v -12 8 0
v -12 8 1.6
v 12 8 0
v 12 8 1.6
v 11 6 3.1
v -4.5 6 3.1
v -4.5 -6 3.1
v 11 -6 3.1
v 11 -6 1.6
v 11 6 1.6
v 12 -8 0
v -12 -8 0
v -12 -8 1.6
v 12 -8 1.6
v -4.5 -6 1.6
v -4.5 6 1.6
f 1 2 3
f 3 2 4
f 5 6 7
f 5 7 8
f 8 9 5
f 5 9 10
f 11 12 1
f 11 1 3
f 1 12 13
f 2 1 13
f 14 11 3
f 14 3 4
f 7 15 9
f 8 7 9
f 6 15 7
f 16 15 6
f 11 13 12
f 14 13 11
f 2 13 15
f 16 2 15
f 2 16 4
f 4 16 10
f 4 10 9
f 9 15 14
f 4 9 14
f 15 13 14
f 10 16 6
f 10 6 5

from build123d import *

# Parameters (mm, degrees)
F0_W     = 24
F0_H     = 1.6
F1_DEPTH = 8
F2_W     = 15.5
F2_H     = 12
F3_DEPTH = 1.5


with BuildPart() as f1:
    # F0 (on Front) → F1 (new body, symmetric)
    with BuildSketch(Plane.XZ):
        with Locations((0, 0.8)):
            Rectangle(F0_W, F0_H)
    extrude(amount=F1_DEPTH, both=True)

    # F2 (on face) → F3 (join)
    with BuildSketch(Plane.XY.offset(1.6)):
        with Locations((3.25, 0)):
            Rectangle(F2_W, F2_H)
    extrude(amount=F3_DEPTH)


solid = f1.part
